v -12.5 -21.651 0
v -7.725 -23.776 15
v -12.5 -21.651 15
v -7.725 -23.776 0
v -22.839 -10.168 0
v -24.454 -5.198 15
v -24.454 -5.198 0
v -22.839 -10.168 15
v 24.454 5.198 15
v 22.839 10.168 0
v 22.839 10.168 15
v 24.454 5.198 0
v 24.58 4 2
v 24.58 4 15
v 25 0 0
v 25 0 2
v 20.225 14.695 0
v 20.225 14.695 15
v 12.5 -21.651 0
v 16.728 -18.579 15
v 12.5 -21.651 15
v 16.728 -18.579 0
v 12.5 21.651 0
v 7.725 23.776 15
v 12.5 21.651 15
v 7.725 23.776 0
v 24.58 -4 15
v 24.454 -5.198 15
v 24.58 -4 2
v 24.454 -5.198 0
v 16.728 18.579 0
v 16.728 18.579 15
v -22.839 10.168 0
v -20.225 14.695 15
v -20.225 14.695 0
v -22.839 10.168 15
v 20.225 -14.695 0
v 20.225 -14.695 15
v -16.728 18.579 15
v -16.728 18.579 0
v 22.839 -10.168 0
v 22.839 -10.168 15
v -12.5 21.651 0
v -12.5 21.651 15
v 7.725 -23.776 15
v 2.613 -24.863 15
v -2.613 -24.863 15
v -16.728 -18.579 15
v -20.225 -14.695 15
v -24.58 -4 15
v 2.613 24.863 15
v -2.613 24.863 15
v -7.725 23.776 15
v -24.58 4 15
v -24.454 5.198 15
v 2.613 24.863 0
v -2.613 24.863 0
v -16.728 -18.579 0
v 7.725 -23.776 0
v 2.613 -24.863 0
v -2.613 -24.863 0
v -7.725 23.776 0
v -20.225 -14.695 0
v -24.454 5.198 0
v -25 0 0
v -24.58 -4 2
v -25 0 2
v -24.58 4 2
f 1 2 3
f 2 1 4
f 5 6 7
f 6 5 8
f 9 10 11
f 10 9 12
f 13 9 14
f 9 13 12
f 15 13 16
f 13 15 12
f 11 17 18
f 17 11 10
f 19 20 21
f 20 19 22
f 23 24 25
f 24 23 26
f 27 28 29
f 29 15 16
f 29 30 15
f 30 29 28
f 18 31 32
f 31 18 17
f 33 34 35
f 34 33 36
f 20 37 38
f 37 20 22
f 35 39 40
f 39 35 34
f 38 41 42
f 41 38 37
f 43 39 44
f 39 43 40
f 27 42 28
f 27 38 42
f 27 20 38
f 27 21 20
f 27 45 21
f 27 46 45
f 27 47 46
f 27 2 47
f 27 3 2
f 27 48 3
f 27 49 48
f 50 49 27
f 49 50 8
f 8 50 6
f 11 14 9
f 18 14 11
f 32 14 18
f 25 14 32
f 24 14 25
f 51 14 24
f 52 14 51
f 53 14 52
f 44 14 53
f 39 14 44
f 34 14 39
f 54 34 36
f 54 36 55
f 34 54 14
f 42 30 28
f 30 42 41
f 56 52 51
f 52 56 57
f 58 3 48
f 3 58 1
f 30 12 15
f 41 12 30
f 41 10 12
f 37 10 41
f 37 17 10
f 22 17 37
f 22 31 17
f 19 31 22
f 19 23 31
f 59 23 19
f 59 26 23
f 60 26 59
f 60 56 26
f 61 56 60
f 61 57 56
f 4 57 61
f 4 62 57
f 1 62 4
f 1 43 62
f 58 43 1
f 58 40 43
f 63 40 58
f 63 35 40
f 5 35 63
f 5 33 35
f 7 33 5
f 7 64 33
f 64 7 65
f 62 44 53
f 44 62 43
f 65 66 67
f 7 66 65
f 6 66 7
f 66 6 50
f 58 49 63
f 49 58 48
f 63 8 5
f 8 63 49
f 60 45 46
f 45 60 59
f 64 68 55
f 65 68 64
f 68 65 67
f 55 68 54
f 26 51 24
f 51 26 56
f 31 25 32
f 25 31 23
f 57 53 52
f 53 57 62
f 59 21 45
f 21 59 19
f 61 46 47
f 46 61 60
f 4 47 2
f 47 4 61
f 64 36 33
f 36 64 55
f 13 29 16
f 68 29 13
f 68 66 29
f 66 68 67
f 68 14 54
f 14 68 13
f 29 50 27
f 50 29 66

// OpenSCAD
difference(){
    cylinder(15, 25,25);
    translate([0,0,15+2])
    cube([50, 8, 30], true);
}
